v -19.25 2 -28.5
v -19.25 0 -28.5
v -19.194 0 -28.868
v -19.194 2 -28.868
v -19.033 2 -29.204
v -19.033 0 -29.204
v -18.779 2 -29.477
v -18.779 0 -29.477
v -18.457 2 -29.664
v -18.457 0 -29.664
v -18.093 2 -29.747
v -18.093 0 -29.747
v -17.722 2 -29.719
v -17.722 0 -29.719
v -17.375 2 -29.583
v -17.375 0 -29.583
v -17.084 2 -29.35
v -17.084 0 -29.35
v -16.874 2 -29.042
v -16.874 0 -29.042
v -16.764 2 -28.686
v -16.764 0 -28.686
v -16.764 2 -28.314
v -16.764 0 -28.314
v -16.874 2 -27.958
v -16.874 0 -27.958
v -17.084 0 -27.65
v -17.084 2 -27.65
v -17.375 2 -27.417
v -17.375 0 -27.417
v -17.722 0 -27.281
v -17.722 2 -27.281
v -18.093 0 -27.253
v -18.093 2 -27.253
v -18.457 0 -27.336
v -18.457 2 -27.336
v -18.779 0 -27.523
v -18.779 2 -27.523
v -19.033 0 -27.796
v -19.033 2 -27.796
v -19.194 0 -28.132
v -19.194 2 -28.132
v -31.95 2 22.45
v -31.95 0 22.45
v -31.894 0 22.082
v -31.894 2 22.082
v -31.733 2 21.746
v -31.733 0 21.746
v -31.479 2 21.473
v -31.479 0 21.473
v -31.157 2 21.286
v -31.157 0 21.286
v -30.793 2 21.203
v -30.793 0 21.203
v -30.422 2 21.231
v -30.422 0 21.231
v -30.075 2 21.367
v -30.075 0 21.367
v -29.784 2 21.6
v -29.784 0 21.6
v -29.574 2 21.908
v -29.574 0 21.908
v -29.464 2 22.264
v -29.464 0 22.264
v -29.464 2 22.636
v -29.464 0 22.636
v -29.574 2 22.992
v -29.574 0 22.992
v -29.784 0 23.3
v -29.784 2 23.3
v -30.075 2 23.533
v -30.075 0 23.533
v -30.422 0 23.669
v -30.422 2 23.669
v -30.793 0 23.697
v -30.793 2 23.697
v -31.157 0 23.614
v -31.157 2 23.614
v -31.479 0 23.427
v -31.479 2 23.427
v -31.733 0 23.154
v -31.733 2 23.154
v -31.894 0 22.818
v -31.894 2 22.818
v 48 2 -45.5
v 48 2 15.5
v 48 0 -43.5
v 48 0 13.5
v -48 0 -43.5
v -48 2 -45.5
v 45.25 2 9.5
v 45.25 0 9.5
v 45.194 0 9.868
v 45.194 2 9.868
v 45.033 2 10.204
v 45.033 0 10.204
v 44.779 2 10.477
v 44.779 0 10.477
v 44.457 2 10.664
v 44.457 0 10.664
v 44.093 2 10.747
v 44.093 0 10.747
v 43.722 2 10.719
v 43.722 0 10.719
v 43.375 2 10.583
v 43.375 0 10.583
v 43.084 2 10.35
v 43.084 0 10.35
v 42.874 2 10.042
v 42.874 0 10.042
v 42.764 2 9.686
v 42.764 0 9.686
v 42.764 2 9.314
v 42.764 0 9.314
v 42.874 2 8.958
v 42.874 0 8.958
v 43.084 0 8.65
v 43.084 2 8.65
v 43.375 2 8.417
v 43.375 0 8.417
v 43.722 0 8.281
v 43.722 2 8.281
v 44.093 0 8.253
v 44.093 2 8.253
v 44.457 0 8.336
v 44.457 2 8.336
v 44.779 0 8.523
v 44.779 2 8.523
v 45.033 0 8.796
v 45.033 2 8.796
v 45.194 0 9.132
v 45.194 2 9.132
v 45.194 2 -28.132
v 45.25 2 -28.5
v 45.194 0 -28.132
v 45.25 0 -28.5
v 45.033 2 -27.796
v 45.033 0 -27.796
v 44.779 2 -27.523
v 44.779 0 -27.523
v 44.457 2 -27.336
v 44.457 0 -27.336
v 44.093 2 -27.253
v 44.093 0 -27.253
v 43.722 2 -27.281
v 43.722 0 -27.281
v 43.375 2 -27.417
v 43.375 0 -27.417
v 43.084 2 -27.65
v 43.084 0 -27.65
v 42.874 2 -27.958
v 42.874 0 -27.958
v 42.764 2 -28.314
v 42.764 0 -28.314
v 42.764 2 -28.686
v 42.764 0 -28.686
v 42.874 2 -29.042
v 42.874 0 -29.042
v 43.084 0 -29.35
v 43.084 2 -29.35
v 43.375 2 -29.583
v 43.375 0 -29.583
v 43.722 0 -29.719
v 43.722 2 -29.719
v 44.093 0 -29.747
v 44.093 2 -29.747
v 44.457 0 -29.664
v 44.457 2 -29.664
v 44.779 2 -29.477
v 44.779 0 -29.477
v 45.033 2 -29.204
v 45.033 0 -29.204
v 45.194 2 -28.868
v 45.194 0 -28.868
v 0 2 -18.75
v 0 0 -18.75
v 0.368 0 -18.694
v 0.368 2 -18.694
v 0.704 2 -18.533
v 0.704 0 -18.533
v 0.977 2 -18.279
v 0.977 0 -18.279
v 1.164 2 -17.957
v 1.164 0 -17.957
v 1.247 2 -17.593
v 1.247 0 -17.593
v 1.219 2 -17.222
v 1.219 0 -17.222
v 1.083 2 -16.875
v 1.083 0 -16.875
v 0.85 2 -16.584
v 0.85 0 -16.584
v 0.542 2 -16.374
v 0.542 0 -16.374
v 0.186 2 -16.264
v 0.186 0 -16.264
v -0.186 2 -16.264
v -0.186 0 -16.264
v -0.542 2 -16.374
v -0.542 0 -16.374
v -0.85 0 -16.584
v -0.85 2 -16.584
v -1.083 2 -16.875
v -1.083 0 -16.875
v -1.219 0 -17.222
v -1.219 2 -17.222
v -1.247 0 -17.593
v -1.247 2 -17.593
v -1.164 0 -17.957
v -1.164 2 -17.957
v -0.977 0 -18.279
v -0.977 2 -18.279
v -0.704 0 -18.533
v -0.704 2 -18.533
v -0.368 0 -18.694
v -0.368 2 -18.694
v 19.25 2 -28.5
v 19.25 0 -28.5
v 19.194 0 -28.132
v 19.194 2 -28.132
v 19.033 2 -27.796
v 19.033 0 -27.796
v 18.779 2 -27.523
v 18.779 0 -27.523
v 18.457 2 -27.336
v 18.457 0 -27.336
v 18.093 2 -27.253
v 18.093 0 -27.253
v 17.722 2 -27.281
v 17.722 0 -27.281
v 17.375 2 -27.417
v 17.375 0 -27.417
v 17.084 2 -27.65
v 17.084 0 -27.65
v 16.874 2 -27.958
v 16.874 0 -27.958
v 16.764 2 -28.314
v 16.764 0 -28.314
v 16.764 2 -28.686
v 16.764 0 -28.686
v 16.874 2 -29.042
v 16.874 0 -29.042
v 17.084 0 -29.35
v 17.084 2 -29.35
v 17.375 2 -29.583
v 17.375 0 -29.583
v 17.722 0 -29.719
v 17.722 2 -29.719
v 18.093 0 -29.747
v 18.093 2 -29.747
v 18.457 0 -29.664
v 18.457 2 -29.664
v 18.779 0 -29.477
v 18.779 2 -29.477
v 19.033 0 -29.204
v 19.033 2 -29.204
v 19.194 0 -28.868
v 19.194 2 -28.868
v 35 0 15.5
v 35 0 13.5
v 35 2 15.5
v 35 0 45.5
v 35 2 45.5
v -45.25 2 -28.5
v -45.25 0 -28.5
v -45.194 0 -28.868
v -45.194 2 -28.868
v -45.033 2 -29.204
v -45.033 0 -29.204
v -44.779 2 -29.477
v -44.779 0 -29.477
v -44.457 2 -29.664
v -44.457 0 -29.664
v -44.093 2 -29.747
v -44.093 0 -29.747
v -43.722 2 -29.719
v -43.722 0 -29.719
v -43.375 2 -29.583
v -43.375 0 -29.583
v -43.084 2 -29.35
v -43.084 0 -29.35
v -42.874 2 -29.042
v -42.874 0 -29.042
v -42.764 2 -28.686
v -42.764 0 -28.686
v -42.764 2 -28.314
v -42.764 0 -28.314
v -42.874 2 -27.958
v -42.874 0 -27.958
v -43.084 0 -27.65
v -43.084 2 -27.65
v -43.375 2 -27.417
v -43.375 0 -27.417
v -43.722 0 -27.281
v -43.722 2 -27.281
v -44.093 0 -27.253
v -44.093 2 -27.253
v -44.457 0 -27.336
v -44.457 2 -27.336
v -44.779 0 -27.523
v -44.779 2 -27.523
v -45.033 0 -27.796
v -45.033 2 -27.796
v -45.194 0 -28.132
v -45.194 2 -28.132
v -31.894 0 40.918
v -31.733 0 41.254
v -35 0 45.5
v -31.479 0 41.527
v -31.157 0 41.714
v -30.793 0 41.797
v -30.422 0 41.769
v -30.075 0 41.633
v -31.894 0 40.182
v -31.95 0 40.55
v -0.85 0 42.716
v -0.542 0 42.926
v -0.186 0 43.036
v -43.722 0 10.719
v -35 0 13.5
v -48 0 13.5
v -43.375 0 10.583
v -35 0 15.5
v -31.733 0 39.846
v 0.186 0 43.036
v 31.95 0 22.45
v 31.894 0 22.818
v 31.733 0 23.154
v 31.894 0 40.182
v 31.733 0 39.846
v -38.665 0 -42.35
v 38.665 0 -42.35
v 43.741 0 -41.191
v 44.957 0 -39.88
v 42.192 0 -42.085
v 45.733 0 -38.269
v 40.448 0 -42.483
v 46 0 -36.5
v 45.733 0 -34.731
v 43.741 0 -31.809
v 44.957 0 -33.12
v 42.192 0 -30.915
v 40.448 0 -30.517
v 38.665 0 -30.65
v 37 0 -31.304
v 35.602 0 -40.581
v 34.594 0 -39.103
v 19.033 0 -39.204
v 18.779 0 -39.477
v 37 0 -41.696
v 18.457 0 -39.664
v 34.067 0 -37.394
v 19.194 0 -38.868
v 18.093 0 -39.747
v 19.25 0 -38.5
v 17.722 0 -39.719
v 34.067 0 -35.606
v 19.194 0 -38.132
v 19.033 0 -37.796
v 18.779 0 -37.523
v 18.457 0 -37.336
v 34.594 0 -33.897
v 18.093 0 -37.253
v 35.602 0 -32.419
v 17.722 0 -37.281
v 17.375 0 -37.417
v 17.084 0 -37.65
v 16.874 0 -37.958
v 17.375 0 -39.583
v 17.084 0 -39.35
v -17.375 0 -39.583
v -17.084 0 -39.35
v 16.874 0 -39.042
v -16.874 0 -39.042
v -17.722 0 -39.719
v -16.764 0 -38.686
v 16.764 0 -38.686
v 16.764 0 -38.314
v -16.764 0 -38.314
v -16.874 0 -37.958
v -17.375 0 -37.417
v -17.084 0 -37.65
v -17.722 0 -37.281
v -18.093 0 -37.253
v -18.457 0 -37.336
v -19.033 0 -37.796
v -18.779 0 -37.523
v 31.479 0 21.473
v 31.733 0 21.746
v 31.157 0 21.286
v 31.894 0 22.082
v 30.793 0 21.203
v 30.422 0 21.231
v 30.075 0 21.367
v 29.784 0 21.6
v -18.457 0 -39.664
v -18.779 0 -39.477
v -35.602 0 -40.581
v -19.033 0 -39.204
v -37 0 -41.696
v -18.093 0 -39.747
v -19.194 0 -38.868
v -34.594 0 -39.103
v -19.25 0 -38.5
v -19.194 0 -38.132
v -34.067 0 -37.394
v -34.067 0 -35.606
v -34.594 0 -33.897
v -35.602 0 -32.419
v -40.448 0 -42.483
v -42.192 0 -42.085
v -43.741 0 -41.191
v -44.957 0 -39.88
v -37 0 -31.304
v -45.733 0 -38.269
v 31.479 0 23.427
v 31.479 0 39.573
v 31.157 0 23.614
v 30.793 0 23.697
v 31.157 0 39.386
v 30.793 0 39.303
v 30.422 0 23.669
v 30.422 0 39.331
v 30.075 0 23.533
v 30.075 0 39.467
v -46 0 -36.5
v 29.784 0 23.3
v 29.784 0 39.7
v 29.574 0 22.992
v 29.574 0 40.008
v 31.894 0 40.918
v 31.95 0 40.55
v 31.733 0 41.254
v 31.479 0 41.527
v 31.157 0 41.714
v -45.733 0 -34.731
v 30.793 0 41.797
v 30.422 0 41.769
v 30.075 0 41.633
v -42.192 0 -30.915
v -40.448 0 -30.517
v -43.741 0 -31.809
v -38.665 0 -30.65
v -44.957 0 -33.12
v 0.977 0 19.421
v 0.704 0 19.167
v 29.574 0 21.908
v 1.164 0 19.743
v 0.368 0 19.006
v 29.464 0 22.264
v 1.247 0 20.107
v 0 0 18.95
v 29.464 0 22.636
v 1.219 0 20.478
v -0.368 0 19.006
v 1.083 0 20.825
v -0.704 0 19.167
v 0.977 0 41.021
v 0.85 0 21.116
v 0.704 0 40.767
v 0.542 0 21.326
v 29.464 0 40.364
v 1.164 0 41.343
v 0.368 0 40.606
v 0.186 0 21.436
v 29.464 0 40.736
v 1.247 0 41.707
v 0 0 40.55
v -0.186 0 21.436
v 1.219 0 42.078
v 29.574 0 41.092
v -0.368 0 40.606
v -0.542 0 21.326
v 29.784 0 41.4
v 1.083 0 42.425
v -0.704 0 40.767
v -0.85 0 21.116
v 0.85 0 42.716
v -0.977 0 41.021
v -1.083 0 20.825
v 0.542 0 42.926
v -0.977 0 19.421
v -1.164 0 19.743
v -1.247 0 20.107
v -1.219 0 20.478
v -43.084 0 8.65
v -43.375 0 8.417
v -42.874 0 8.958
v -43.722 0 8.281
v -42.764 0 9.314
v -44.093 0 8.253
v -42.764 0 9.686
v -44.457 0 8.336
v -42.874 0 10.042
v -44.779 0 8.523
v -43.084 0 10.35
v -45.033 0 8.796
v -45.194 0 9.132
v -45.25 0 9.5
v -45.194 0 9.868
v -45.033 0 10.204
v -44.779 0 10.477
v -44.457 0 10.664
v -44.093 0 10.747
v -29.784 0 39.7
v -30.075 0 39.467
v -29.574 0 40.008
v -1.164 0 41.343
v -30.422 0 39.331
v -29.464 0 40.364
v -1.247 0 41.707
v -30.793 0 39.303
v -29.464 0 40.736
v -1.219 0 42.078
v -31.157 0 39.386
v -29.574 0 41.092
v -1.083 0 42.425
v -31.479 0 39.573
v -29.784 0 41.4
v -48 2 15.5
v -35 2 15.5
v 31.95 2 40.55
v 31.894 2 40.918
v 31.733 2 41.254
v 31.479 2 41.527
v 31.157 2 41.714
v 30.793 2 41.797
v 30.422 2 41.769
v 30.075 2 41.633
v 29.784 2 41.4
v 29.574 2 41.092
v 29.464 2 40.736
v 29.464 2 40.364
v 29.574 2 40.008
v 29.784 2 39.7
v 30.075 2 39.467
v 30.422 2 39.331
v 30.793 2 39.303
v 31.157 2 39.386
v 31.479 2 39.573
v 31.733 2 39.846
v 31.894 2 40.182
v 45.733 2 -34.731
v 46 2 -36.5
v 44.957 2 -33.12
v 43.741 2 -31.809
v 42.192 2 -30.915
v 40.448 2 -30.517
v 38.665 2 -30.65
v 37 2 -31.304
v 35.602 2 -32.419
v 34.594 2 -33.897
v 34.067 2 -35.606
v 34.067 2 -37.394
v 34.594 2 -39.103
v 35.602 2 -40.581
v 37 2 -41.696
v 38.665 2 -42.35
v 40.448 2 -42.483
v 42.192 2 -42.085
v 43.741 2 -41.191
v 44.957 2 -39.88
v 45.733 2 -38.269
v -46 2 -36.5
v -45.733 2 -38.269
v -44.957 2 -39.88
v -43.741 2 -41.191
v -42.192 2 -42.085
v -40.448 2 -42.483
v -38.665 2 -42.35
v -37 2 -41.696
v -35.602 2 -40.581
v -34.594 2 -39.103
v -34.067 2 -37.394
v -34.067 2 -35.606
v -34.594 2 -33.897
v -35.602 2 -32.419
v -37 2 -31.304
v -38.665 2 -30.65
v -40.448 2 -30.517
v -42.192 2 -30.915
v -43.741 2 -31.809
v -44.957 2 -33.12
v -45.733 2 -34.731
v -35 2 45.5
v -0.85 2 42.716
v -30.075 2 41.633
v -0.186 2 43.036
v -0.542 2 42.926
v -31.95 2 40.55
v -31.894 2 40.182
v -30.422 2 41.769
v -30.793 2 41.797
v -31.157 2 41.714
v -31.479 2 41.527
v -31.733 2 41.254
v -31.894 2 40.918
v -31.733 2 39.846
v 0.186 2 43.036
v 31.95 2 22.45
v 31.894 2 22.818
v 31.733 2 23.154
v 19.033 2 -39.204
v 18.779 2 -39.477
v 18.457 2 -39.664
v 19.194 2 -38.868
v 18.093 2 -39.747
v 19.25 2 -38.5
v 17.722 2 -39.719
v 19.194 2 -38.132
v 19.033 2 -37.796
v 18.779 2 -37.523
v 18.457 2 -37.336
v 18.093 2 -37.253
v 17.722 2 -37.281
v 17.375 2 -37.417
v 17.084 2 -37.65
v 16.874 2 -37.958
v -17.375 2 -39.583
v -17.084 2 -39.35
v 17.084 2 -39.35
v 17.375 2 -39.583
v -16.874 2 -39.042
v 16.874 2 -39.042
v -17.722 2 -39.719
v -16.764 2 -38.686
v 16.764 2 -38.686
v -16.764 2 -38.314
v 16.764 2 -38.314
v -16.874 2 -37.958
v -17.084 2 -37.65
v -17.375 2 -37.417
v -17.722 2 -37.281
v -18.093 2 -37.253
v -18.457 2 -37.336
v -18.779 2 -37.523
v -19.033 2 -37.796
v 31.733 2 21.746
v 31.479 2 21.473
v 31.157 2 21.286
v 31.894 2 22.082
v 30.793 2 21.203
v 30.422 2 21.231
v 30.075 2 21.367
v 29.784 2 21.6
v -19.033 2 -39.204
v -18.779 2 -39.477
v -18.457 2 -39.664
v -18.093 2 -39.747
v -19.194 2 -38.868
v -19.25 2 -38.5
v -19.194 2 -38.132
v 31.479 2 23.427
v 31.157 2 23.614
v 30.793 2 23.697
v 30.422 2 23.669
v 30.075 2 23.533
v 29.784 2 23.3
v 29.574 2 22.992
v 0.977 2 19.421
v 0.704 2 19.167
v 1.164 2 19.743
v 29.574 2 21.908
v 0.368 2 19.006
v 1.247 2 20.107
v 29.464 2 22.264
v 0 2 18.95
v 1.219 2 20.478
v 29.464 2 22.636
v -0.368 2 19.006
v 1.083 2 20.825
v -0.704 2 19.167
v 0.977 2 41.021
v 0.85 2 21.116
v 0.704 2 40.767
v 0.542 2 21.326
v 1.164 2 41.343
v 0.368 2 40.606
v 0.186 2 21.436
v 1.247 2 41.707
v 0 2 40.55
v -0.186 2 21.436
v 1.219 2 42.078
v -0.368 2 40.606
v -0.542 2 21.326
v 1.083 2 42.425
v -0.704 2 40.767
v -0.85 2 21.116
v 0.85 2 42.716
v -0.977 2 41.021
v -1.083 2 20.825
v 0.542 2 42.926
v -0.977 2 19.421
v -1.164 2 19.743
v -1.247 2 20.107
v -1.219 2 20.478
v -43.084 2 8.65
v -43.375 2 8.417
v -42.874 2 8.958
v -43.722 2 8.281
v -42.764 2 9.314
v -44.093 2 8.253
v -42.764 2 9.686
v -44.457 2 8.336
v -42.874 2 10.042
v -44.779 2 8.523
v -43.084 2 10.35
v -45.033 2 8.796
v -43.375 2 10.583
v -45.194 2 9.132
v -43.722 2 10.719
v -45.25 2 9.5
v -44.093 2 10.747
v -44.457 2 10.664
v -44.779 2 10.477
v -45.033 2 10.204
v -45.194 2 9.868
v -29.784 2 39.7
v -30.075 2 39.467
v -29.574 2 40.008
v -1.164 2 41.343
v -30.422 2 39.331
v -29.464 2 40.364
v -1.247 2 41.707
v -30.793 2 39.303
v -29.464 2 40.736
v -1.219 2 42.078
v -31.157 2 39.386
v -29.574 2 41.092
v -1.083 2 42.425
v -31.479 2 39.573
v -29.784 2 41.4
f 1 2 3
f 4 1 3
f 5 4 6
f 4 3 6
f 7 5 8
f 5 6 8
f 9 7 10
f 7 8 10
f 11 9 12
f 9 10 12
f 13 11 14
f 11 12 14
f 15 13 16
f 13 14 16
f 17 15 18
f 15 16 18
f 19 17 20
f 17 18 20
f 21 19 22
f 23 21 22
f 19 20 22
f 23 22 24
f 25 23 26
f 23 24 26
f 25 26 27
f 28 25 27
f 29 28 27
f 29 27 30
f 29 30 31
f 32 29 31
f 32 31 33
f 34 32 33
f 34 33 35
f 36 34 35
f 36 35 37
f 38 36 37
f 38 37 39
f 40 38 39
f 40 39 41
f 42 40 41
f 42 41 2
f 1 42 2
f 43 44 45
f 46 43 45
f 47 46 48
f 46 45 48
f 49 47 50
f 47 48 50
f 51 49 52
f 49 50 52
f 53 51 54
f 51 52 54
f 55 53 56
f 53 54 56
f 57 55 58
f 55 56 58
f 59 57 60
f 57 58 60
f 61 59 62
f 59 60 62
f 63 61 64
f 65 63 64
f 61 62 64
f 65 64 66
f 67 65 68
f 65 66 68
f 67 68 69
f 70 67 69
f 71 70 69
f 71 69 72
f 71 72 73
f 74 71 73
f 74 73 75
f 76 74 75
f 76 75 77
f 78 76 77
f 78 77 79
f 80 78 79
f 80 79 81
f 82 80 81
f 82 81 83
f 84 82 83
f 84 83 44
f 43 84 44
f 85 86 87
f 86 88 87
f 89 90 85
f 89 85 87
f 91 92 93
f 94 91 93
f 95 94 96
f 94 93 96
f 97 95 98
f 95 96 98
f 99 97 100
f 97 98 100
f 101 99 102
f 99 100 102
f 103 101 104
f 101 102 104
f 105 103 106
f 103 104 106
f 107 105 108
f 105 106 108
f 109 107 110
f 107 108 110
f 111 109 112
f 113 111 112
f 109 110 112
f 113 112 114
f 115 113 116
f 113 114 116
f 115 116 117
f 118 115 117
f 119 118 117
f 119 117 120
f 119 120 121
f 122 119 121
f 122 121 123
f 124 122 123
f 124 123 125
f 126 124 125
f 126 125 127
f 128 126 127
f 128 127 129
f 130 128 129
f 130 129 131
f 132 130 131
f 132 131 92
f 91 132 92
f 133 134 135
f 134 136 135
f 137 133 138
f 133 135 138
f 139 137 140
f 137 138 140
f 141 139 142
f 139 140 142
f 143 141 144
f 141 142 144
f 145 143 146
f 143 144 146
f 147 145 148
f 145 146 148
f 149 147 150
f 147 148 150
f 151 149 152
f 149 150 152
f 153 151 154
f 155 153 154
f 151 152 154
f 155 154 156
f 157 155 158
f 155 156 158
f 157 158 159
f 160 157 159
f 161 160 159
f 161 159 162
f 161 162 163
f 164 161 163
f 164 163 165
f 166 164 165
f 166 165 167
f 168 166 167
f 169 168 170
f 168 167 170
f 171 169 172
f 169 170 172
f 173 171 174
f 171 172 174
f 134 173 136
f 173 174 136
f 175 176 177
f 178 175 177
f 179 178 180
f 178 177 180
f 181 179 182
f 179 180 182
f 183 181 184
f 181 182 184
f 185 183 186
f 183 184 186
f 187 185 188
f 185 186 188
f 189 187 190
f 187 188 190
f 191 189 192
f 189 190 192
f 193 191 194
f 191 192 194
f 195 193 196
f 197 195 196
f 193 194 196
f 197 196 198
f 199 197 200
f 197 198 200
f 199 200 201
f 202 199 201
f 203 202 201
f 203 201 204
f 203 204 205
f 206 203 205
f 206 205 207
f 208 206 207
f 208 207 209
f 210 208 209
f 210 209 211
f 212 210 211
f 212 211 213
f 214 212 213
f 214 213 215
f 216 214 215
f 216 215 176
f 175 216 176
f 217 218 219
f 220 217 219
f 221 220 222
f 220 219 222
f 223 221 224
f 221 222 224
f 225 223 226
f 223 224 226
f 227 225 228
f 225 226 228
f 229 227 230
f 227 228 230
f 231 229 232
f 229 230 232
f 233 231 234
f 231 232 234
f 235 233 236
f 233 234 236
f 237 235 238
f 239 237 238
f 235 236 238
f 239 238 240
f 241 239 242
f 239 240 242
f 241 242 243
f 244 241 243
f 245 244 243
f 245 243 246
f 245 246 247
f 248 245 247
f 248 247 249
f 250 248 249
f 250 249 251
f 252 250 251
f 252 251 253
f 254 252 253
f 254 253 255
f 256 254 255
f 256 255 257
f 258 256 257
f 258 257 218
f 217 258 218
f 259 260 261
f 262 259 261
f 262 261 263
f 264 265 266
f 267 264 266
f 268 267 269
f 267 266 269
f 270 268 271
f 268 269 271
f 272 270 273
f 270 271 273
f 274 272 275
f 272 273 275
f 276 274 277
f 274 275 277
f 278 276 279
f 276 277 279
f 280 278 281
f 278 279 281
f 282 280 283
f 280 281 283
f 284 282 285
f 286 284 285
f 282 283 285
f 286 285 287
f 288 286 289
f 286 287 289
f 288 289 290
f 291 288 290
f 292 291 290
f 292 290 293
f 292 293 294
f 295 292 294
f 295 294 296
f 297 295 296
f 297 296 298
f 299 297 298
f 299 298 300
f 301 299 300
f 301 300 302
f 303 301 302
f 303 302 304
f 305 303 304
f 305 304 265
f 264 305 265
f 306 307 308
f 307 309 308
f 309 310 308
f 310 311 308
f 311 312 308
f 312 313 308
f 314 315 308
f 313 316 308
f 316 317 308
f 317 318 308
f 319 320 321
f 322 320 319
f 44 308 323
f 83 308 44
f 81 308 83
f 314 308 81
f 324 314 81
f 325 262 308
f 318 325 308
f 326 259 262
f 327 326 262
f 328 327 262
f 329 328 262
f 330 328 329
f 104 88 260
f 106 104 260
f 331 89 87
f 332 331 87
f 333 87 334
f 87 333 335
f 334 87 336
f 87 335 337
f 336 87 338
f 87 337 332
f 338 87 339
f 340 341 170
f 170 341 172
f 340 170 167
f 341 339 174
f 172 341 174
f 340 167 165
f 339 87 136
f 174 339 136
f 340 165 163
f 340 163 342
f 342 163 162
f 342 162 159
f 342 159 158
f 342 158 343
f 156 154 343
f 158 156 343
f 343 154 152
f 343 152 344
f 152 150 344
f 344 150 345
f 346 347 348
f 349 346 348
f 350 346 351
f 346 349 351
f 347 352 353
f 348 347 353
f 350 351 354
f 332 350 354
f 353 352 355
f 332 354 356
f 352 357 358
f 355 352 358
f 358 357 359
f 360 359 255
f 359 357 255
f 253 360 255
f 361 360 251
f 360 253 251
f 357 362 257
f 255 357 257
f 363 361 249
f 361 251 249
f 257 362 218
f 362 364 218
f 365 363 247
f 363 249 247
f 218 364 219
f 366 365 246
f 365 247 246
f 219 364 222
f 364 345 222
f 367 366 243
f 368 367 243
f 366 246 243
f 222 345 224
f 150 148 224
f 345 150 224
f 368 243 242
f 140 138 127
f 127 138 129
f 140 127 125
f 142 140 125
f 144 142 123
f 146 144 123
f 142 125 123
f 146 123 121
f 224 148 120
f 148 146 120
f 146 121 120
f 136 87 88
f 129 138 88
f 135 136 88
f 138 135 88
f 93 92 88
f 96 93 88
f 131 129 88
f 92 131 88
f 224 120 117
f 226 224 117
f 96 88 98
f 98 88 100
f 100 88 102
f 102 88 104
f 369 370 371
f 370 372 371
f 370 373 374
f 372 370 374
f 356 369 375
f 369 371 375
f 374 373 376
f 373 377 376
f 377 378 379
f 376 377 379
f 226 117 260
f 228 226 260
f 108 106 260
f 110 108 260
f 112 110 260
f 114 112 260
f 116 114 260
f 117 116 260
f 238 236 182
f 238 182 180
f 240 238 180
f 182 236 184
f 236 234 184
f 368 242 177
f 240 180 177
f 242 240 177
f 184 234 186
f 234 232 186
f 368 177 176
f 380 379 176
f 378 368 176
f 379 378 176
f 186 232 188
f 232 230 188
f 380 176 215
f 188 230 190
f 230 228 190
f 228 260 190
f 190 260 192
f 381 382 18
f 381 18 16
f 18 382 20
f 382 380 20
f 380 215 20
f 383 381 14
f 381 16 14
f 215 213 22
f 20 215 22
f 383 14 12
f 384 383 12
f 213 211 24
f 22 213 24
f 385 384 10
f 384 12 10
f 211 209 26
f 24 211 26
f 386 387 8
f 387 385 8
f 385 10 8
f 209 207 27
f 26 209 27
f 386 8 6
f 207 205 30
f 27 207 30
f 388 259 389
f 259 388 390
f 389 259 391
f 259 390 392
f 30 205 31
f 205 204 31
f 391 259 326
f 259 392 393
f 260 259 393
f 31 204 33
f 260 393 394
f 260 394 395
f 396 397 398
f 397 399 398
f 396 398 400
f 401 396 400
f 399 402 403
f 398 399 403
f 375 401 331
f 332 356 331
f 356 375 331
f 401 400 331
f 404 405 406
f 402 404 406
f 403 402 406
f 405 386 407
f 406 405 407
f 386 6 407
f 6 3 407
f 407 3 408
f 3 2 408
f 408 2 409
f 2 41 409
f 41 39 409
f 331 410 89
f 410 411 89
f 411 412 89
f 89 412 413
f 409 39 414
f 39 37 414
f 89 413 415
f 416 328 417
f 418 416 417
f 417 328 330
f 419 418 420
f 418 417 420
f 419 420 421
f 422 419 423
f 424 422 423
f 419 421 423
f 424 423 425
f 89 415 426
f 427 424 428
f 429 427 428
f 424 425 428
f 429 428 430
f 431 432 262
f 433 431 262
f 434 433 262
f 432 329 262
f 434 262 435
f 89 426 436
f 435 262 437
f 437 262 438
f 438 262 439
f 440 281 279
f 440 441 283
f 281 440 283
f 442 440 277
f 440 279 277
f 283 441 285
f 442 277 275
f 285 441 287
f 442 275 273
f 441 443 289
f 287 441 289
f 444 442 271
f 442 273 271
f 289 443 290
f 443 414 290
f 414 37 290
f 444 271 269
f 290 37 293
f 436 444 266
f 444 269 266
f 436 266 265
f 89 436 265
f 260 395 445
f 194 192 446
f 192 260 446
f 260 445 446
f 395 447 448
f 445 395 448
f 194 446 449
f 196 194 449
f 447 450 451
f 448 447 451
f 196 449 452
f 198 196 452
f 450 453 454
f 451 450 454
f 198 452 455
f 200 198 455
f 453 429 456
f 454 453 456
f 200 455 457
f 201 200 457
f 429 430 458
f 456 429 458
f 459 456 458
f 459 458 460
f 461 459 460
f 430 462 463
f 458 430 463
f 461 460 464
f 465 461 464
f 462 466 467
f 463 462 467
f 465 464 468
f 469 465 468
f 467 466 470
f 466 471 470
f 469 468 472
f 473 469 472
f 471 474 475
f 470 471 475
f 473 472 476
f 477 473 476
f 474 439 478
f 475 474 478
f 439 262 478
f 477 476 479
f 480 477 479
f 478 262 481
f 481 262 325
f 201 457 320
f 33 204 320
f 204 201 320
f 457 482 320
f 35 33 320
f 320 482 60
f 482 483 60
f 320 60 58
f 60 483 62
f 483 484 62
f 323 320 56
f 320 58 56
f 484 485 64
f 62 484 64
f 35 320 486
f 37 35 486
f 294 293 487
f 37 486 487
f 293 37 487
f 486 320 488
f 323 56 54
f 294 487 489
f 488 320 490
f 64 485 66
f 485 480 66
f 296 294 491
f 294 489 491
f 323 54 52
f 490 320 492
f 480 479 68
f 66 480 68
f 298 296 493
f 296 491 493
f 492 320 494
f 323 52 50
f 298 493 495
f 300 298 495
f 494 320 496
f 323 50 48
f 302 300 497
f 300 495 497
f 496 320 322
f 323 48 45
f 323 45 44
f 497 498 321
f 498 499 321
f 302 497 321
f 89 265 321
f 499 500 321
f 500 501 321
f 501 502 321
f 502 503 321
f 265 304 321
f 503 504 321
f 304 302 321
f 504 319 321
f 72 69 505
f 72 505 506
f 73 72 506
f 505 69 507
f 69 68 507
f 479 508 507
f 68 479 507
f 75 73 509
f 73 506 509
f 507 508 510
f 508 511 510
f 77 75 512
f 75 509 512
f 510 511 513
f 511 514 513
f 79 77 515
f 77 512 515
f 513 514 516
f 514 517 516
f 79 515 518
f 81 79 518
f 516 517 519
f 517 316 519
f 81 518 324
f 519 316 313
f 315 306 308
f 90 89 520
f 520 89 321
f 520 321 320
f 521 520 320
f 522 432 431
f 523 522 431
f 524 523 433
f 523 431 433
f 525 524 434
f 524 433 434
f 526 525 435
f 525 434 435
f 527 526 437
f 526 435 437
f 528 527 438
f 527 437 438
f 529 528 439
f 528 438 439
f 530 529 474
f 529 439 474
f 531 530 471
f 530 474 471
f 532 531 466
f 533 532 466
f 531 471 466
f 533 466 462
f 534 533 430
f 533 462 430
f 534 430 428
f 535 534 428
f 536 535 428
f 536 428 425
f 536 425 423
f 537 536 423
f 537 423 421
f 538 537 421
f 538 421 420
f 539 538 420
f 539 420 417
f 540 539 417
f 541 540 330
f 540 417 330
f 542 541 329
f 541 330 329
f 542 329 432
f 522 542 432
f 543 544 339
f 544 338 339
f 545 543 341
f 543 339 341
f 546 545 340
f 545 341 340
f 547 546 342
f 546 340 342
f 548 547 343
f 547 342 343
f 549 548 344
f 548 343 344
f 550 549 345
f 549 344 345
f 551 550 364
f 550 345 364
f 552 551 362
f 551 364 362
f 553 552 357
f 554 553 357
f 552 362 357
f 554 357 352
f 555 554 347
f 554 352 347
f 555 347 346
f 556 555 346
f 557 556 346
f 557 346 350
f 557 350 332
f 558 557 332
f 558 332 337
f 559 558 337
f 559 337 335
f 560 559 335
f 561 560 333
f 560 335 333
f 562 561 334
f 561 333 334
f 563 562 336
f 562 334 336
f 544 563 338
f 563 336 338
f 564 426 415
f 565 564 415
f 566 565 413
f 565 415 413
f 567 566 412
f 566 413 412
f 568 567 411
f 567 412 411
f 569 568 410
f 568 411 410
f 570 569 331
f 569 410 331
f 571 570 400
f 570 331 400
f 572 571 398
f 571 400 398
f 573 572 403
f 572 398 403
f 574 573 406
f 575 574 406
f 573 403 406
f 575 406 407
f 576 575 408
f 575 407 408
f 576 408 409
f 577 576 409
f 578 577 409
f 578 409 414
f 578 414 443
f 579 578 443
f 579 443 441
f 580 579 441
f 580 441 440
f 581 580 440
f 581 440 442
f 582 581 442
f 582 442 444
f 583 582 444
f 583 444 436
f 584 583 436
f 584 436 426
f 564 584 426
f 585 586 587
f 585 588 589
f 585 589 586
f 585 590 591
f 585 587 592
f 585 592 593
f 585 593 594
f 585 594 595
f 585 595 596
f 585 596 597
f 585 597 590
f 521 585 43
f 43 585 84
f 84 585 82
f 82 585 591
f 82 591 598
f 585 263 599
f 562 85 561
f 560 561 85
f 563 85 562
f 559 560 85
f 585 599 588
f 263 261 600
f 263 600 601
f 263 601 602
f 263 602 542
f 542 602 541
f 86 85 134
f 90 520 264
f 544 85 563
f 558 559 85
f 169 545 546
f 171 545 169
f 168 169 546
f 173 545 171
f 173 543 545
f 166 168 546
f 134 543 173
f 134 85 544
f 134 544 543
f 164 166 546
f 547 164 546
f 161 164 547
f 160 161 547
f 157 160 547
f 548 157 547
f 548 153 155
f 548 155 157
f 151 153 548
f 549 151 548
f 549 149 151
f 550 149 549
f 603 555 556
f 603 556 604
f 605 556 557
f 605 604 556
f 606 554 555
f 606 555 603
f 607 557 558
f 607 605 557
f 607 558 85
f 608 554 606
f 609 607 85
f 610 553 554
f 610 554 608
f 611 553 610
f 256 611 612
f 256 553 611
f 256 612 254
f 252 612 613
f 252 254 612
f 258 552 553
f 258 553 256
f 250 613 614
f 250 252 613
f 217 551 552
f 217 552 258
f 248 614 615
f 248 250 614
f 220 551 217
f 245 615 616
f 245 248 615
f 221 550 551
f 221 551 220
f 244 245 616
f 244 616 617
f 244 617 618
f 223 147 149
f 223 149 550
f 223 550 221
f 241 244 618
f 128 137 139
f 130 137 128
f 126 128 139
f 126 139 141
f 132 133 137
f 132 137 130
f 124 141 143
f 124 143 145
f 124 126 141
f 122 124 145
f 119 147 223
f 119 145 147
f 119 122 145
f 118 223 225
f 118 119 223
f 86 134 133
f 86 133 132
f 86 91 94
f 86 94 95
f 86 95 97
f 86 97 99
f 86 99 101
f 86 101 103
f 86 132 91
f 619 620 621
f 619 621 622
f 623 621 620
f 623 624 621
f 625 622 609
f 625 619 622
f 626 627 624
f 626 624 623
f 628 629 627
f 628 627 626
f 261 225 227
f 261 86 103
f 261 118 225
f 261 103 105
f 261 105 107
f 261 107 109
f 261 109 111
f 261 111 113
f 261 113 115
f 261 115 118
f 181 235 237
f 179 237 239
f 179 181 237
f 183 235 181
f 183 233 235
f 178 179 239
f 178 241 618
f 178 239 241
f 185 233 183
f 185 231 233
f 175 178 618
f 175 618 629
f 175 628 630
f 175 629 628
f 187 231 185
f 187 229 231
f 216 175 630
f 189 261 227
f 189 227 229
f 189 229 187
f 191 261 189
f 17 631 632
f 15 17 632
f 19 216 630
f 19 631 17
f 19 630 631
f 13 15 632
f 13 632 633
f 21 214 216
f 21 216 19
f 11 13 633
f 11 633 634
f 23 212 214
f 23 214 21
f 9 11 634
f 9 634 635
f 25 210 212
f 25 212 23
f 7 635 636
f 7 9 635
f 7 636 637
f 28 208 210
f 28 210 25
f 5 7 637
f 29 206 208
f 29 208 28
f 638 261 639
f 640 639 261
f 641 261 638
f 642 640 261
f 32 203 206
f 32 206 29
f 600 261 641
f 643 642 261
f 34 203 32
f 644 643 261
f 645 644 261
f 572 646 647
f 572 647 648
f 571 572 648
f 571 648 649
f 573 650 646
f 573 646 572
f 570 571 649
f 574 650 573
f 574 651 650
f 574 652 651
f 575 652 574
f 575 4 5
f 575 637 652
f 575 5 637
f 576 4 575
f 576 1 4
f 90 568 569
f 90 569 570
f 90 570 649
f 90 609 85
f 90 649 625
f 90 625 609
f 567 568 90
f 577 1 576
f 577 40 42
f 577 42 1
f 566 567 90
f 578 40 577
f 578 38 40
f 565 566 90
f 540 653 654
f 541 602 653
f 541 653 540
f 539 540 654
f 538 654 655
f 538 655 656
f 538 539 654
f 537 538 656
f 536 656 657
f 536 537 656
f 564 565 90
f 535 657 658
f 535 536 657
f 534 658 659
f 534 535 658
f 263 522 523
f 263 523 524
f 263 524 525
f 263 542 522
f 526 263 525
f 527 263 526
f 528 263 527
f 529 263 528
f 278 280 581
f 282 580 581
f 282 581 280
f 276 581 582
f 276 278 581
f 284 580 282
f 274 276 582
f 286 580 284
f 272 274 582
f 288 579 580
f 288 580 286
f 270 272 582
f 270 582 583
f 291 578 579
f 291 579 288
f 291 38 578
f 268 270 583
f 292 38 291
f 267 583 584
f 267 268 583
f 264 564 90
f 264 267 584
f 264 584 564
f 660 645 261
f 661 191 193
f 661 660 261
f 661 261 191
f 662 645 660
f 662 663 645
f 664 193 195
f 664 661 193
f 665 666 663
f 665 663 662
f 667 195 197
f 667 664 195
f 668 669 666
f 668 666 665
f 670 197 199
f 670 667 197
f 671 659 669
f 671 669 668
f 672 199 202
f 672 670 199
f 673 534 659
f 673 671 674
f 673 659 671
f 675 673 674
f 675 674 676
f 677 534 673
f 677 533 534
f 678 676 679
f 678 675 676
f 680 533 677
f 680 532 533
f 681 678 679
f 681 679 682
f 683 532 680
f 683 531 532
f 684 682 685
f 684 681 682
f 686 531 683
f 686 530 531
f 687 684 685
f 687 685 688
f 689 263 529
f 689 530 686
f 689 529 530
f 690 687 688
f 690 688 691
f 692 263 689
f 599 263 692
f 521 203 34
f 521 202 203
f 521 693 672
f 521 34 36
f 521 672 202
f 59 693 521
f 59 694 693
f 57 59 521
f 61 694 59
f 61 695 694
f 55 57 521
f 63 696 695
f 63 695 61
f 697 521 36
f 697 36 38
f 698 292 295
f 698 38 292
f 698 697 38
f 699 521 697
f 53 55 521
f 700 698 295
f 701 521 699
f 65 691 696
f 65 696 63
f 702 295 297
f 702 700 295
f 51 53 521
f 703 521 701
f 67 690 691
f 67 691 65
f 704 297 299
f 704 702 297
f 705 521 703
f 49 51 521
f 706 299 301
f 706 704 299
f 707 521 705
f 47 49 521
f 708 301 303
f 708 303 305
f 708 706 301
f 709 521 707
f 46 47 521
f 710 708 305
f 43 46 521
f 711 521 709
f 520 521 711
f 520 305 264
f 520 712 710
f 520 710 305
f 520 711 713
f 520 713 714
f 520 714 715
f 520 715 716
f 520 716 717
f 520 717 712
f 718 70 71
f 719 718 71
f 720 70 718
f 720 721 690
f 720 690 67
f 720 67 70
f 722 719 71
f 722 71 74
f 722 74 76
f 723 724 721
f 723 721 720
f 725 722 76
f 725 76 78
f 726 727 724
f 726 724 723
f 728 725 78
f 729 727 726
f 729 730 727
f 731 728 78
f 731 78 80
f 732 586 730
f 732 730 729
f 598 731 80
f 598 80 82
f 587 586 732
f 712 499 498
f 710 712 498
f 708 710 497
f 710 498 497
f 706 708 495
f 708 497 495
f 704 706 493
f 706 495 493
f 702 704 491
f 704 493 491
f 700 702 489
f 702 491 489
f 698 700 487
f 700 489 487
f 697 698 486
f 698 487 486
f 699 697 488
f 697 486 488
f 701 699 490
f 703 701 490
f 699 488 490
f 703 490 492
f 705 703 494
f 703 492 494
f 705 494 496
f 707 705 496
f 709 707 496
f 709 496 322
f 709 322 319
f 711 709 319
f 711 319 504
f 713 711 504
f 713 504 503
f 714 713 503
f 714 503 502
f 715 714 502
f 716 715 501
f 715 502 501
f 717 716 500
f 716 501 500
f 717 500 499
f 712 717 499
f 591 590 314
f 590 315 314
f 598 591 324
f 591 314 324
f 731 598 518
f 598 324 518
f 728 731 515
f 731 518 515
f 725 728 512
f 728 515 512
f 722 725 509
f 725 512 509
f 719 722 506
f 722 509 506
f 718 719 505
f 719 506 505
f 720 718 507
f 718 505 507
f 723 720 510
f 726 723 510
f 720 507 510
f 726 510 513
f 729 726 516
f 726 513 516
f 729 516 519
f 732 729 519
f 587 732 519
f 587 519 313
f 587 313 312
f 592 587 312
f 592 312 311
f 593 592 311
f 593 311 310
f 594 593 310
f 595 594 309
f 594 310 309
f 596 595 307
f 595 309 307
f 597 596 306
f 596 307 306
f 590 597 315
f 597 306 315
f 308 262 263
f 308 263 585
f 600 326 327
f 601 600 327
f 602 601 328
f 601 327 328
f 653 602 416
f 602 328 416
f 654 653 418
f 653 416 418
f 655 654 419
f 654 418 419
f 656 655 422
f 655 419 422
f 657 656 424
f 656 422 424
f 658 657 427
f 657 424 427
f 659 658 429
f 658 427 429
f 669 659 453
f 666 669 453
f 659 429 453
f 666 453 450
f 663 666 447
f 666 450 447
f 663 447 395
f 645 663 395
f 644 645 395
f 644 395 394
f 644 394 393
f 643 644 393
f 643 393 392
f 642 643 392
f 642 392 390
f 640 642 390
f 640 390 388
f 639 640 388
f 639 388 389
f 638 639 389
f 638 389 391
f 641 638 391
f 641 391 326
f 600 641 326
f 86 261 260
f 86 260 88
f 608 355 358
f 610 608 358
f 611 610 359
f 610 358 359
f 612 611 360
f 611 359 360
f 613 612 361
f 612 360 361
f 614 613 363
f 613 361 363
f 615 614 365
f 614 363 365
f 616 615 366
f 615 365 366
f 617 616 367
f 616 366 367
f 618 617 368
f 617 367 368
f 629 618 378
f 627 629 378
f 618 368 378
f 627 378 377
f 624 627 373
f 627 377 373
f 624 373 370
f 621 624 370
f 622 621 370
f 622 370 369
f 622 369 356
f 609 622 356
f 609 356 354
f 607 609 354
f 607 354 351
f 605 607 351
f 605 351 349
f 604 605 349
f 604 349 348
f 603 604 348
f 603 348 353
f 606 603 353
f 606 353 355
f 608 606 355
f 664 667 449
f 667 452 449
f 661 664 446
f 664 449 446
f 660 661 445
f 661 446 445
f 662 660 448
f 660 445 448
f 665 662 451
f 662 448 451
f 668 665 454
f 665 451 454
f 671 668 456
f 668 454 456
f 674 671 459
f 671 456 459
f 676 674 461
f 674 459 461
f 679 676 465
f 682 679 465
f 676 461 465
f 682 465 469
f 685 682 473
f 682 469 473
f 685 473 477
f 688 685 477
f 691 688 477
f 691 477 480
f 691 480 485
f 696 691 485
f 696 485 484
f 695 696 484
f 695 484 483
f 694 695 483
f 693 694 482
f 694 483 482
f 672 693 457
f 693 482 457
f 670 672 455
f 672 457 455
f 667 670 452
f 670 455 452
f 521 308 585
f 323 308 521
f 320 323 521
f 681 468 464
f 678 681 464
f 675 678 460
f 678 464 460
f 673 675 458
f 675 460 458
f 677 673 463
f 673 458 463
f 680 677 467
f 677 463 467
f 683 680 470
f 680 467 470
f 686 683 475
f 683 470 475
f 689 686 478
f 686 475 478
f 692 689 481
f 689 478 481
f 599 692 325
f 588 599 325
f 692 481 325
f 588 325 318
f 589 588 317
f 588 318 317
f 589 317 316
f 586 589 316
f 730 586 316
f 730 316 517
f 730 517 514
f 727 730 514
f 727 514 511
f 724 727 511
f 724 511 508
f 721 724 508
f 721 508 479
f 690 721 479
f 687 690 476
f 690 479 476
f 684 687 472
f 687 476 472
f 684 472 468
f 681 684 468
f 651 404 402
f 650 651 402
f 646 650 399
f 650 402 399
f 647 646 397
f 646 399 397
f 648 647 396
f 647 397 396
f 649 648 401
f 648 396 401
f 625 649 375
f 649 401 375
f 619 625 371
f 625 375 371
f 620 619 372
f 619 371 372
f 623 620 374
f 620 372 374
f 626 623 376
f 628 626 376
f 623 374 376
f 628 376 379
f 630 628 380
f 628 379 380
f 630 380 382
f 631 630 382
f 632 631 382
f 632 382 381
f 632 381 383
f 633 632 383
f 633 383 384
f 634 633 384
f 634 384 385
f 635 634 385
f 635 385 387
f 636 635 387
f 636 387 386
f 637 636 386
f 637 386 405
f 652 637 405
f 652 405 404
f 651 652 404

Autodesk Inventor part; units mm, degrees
ref_plane "YZ Plane" through (0, 0, 0) normal (1, 0, 0) x (0, 1, 0)
ref_plane "XZ Plane" through (0, 0, 0) normal (0, 1, 0) x (-1, 0, 0)
ref_plane "XY Plane" through (0, 0, 0) normal (0, 0, 1) x (1, 0, 0)
sketch "Sketch1" plane through (0, 0, 0) normal (0, 1, 0) x (-1, 0, 0)
  line L0 (35, 45.5) -> (35, 15.5)
  line L1 (9, 15.5) -> (35, 15.5) construction
  line L2 (0, 15.5) -> (9, 15.5) construction
  line L3 (35, 15.5) -> (48, 15.5)
  line L4 (0, -45.5) -> (0, 45.5)
  line L5 (0, -45.5) -> (48, -45.5)
  line L6 (0, 45.5) -> (35, 45.5)
  line L7 (48, -45.5) -> (48, 15.5)
  line L8 (30.7, 40.55) -> (35, 40.55) construction
  line L9 (30.7, 40.55) -> (30.7, 22.45) construction
  circle A0 centre (30.7, 22.45) radius 1.25
  circle A1 centre (30.7, 40.55) radius 1.25
  line L10 (30.7, 22.45) -> (30.7, 15.5) construction
  line L11 (44, 15.5) -> (44, 9.5) construction
  line L12 (44, 9.5) -> (48, 9.5) construction
  circle A2 centre (44, 9.5) radius 1.25
  circle A3 centre (44, -28.5) radius 1.25
  circle A4 centre (18, -28.5) radius 1.25
  circle A5 centre (18, -38.5) radius 1.25
  arc A6 (0, -18.75) -> (0, -16.25) centre (0, -17.5) ccw
  arc A7 (0, 40.55) -> (0, 43.05) centre (0, 41.8) ccw
  arc A8 (0, 18.95) -> (0, 21.45) centre (0, 20.2) ccw
  line L13 (0, 41.8) -> (30.7, 41.8) construction
  circle A9 centre (40, -36.5) radius 6
  point P0 (0, 0)
  point P1 (-50, 0)
  point P2 (0, 0)
  dimension "d17" = 2.5
  dimension "d6" = 30
  dimension "d9" = 26
  dimension "d10" = 9
  dimension "d11" = 48
  dimension "d12" = 91
  dimension "d14" = 4.3
  dimension "d15" = 18.1
  dimension "d16" = 2.5
  dimension "d20" = 6.95
  dimension "d25" = 6
  dimension "d26" = 4
  dimension "d27" = 2.5
  dimension "d30" = 2.5
  dimension "d32" = 2.5
  dimension "d33" = 18
  dimension "d34" = 2.5
  dimension "d35" = 10
  dimension "d36" = 2.5
  dimension "d37" = 2.5
  dimension "d38" = 1.25
  dimension "d42" = 12
  dimension "d43" = 8
  dimension "d45" = 27
  dimension "d46" = 46
  dimension "d47" = 38
  dimension "d48" = 2.25
extrude "Extrusion1" add sketch "Sketch1" along normal blind 2 contours L0 L3 L7 L5 L4 A6 A8 A7 L6 | A7 L4 | A8 L4 | L4 A6 | A0 | A1 | A2 | A3 | A4 | A5 | A9
extrude "Extrusion2" cut sketch "Sketch1" along normal through all contours A7 L4 | A8 L4 | L4 A6 | A0 | A1 | A2 | A3 | A4 | A5 | A9
mirror "Mirror1" about plane through (0, 0, 0) normal (1, 0, 0) of "Extrusion1", "Extrusion2"
sketch "Sketch3" plane through (0, 0, 0) normal (1, 0, 0) x (0, 1, 0)
  line L0 (0, 15.5) -> (0, -45.5) projected
  line L1 (0, -45.5) -> (2, -45.5) projected
  line L2 (0, -45.5) -> (2, -45.5)
  line L3 (2, -45.5) -> (0, -43.5)
  line L4 (0, -43.5) -> (0, -45.5)
  line L5 (2, -45.5) -> (2, 15.5) projected
  point P0 (0, 0)
  dimension "d24" = 45
extrude "Extrusion3" cut sketch "Sketch3" along normal through all both and the other way through all
chamfer "Chamfer1" distance 2 angle 45 2 edges at (-41.5, 0, 15.5) (41.5, 0, 15.5)
properties part number "Podstawa"
